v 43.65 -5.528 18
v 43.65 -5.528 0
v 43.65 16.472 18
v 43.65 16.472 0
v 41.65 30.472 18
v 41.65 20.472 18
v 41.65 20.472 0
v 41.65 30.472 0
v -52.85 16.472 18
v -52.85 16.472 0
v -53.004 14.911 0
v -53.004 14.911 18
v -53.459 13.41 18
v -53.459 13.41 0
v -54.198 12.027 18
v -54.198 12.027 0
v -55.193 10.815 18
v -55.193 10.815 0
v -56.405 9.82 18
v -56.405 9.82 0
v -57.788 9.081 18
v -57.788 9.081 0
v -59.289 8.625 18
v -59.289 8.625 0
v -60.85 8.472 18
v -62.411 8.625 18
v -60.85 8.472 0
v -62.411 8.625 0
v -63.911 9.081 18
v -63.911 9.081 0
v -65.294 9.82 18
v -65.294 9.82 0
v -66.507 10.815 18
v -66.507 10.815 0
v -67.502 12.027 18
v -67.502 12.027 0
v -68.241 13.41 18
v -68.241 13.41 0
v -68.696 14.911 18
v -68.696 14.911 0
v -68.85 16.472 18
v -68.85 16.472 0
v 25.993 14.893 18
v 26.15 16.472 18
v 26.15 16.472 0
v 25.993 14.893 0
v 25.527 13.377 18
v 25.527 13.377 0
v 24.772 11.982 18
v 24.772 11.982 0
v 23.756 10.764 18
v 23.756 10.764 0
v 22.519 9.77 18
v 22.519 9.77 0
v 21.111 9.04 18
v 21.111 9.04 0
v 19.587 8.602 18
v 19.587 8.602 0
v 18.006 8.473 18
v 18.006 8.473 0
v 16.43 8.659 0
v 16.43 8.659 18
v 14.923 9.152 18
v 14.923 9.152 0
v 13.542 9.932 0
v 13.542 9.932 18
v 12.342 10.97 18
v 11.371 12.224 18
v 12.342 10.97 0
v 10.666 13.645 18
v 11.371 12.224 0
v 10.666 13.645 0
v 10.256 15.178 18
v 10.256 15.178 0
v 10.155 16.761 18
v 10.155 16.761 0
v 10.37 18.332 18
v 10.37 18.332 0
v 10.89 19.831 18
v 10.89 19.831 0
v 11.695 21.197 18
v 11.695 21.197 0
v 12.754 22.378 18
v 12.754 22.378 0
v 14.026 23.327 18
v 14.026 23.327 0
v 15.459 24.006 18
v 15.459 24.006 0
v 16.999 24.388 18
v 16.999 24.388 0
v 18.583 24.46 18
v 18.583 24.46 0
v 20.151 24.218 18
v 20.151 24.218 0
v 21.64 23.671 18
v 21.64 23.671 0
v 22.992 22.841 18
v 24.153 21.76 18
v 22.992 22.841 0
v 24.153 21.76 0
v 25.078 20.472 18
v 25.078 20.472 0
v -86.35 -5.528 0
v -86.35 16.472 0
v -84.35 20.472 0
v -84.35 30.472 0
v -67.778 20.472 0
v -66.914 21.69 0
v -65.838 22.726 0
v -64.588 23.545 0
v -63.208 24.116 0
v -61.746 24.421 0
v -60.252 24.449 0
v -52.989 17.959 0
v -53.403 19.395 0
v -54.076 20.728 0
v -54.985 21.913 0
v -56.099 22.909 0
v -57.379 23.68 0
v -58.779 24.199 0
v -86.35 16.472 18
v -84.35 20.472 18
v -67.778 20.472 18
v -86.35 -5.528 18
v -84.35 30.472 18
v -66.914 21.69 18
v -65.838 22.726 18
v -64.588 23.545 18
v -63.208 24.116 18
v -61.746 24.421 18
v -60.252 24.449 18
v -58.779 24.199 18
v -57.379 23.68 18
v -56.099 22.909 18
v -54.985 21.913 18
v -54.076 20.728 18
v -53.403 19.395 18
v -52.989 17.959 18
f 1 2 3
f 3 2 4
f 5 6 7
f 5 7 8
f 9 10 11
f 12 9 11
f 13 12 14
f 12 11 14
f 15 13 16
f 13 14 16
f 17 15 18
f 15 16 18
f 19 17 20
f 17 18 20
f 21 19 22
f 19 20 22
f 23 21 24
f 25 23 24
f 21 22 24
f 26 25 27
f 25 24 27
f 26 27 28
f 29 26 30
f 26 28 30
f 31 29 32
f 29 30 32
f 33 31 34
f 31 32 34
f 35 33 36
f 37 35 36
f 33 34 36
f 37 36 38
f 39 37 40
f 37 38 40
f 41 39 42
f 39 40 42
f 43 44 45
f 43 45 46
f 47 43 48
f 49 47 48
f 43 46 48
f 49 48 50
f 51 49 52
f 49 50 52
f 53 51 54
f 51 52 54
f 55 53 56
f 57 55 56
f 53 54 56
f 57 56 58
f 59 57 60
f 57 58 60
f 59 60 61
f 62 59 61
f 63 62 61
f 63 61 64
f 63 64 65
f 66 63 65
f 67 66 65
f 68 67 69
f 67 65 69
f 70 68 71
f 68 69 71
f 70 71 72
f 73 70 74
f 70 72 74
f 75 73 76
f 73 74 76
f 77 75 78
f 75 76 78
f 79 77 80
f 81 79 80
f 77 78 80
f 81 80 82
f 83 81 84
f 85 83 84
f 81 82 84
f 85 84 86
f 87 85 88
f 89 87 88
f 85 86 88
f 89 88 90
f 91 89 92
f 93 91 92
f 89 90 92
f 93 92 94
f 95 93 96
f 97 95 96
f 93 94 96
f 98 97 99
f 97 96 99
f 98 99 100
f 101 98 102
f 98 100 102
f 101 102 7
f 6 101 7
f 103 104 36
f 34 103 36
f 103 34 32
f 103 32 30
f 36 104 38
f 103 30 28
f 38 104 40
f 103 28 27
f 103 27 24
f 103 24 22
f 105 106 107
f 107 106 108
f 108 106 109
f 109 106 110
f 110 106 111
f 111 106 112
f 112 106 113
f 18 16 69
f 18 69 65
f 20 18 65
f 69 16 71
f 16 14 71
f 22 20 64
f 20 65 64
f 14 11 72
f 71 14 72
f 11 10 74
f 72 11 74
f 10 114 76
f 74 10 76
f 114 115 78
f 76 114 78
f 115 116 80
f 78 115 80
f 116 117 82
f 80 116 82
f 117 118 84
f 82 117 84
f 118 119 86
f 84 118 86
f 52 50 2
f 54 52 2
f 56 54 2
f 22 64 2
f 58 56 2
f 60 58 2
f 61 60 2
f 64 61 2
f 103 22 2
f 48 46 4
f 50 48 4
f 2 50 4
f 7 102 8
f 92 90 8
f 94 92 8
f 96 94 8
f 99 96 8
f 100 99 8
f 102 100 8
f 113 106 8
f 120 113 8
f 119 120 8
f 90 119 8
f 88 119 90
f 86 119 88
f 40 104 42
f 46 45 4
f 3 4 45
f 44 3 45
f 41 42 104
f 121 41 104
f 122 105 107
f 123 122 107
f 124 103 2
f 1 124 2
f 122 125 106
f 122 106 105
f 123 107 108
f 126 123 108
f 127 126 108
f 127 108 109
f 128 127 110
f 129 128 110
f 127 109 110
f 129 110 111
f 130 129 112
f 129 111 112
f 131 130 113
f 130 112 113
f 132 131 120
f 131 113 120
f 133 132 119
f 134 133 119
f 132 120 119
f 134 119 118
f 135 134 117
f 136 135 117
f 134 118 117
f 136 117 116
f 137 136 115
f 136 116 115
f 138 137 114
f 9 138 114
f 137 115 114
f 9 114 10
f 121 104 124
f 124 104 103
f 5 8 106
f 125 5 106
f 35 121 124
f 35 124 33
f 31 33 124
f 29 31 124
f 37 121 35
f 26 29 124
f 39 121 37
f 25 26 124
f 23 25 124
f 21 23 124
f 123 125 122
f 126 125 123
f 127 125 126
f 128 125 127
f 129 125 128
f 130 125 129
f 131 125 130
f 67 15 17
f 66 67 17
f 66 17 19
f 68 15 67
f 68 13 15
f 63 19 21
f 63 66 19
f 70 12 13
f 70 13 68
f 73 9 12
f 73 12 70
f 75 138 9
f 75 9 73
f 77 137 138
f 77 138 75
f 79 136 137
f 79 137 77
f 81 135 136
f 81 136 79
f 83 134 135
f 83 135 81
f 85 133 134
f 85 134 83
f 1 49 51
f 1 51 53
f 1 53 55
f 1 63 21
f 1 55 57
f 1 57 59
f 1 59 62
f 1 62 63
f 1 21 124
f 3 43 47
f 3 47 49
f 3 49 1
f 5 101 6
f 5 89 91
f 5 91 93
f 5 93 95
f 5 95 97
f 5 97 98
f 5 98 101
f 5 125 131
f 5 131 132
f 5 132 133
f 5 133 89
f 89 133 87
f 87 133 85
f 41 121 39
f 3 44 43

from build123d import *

# Parameters (mm, degrees)
F0_R     = 13
F1_DEPTH = 18
F2_DEPTH = 2
F3_DEPTH = 2


with BuildPart() as f1:
    # F0 (on Top) → F1 (new body)
    with BuildSketch(Plane.XY):
        with BuildLine():
            Line((43.6501808017, 30.4717739075), (-86.3498191983, 30.4717739075))
            Line((-86.3498191983, 30.4717739075), (-86.3498191983, 20.4717739075))
            Line((-86.3498191983, 20.4717739075), (-67.7780224285, 20.4717739075))
            ThreePointArc((-67.7780224285, 20.4717739075), (-58.7792668374, 24.1991805179), (-52.8498191983, 16.4717739075))
            ThreePointArc((-52.8498191983, 16.4717739075), (-60.8498191983, 8.4717739075), (-68.8498191983, 16.4717739075))
            Line((-68.8498191983, 16.4717739075), (-86.3498191983, 16.4717739075))
            Line((-86.3498191983, 16.4717739075), (-86.3498191983, -5.5282260925))
            Line((-86.3498191983, -5.5282260925), (43.6501808017, -5.5282260925))
            Line((43.6501808017, -5.5282260925), (43.6501808017, 16.4717739075))
            Line((43.6501808017, 16.4717739075), (26.1501808017, 16.4717739075))
            ThreePointArc((26.1501808017, 16.4717739075), (10.4227741914, 14.4012215467), (25.078384032, 20.4717739075))
            Line((25.078384032, 20.4717739075), (43.6501808017, 20.4717739075))
            Line((43.6501808017, 20.4717739075), (43.6501808017, 30.4717739075))
        make_face()
        with Locations((-21.3498191983, 16.4717739075)):
            Circle(F0_R, mode=Mode.SUBTRACT)
        with Locations((-21.3498191983, 16.4717739075)):
            Circle(F0_R)
    extrude(amount=F1_DEPTH)

    # F2 (cut): a face of the model
    f2_faces = [f1.faces().sort_by_distance(p)[0] for p in [
        (-86.3498191983, 25.4717739075, 9),
    ]]
    extrude(f2_faces, amount=-F2_DEPTH, mode=Mode.SUBTRACT)

    # F3 (cut): a face of the model
    f3_faces = [f1.faces().sort_by_distance(p)[0] for p in [
        (43.6501808017, 25.4717739075, 9),
    ]]
    extrude(f3_faces, amount=-F3_DEPTH, mode=Mode.SUBTRACT)


solid = f1.part
